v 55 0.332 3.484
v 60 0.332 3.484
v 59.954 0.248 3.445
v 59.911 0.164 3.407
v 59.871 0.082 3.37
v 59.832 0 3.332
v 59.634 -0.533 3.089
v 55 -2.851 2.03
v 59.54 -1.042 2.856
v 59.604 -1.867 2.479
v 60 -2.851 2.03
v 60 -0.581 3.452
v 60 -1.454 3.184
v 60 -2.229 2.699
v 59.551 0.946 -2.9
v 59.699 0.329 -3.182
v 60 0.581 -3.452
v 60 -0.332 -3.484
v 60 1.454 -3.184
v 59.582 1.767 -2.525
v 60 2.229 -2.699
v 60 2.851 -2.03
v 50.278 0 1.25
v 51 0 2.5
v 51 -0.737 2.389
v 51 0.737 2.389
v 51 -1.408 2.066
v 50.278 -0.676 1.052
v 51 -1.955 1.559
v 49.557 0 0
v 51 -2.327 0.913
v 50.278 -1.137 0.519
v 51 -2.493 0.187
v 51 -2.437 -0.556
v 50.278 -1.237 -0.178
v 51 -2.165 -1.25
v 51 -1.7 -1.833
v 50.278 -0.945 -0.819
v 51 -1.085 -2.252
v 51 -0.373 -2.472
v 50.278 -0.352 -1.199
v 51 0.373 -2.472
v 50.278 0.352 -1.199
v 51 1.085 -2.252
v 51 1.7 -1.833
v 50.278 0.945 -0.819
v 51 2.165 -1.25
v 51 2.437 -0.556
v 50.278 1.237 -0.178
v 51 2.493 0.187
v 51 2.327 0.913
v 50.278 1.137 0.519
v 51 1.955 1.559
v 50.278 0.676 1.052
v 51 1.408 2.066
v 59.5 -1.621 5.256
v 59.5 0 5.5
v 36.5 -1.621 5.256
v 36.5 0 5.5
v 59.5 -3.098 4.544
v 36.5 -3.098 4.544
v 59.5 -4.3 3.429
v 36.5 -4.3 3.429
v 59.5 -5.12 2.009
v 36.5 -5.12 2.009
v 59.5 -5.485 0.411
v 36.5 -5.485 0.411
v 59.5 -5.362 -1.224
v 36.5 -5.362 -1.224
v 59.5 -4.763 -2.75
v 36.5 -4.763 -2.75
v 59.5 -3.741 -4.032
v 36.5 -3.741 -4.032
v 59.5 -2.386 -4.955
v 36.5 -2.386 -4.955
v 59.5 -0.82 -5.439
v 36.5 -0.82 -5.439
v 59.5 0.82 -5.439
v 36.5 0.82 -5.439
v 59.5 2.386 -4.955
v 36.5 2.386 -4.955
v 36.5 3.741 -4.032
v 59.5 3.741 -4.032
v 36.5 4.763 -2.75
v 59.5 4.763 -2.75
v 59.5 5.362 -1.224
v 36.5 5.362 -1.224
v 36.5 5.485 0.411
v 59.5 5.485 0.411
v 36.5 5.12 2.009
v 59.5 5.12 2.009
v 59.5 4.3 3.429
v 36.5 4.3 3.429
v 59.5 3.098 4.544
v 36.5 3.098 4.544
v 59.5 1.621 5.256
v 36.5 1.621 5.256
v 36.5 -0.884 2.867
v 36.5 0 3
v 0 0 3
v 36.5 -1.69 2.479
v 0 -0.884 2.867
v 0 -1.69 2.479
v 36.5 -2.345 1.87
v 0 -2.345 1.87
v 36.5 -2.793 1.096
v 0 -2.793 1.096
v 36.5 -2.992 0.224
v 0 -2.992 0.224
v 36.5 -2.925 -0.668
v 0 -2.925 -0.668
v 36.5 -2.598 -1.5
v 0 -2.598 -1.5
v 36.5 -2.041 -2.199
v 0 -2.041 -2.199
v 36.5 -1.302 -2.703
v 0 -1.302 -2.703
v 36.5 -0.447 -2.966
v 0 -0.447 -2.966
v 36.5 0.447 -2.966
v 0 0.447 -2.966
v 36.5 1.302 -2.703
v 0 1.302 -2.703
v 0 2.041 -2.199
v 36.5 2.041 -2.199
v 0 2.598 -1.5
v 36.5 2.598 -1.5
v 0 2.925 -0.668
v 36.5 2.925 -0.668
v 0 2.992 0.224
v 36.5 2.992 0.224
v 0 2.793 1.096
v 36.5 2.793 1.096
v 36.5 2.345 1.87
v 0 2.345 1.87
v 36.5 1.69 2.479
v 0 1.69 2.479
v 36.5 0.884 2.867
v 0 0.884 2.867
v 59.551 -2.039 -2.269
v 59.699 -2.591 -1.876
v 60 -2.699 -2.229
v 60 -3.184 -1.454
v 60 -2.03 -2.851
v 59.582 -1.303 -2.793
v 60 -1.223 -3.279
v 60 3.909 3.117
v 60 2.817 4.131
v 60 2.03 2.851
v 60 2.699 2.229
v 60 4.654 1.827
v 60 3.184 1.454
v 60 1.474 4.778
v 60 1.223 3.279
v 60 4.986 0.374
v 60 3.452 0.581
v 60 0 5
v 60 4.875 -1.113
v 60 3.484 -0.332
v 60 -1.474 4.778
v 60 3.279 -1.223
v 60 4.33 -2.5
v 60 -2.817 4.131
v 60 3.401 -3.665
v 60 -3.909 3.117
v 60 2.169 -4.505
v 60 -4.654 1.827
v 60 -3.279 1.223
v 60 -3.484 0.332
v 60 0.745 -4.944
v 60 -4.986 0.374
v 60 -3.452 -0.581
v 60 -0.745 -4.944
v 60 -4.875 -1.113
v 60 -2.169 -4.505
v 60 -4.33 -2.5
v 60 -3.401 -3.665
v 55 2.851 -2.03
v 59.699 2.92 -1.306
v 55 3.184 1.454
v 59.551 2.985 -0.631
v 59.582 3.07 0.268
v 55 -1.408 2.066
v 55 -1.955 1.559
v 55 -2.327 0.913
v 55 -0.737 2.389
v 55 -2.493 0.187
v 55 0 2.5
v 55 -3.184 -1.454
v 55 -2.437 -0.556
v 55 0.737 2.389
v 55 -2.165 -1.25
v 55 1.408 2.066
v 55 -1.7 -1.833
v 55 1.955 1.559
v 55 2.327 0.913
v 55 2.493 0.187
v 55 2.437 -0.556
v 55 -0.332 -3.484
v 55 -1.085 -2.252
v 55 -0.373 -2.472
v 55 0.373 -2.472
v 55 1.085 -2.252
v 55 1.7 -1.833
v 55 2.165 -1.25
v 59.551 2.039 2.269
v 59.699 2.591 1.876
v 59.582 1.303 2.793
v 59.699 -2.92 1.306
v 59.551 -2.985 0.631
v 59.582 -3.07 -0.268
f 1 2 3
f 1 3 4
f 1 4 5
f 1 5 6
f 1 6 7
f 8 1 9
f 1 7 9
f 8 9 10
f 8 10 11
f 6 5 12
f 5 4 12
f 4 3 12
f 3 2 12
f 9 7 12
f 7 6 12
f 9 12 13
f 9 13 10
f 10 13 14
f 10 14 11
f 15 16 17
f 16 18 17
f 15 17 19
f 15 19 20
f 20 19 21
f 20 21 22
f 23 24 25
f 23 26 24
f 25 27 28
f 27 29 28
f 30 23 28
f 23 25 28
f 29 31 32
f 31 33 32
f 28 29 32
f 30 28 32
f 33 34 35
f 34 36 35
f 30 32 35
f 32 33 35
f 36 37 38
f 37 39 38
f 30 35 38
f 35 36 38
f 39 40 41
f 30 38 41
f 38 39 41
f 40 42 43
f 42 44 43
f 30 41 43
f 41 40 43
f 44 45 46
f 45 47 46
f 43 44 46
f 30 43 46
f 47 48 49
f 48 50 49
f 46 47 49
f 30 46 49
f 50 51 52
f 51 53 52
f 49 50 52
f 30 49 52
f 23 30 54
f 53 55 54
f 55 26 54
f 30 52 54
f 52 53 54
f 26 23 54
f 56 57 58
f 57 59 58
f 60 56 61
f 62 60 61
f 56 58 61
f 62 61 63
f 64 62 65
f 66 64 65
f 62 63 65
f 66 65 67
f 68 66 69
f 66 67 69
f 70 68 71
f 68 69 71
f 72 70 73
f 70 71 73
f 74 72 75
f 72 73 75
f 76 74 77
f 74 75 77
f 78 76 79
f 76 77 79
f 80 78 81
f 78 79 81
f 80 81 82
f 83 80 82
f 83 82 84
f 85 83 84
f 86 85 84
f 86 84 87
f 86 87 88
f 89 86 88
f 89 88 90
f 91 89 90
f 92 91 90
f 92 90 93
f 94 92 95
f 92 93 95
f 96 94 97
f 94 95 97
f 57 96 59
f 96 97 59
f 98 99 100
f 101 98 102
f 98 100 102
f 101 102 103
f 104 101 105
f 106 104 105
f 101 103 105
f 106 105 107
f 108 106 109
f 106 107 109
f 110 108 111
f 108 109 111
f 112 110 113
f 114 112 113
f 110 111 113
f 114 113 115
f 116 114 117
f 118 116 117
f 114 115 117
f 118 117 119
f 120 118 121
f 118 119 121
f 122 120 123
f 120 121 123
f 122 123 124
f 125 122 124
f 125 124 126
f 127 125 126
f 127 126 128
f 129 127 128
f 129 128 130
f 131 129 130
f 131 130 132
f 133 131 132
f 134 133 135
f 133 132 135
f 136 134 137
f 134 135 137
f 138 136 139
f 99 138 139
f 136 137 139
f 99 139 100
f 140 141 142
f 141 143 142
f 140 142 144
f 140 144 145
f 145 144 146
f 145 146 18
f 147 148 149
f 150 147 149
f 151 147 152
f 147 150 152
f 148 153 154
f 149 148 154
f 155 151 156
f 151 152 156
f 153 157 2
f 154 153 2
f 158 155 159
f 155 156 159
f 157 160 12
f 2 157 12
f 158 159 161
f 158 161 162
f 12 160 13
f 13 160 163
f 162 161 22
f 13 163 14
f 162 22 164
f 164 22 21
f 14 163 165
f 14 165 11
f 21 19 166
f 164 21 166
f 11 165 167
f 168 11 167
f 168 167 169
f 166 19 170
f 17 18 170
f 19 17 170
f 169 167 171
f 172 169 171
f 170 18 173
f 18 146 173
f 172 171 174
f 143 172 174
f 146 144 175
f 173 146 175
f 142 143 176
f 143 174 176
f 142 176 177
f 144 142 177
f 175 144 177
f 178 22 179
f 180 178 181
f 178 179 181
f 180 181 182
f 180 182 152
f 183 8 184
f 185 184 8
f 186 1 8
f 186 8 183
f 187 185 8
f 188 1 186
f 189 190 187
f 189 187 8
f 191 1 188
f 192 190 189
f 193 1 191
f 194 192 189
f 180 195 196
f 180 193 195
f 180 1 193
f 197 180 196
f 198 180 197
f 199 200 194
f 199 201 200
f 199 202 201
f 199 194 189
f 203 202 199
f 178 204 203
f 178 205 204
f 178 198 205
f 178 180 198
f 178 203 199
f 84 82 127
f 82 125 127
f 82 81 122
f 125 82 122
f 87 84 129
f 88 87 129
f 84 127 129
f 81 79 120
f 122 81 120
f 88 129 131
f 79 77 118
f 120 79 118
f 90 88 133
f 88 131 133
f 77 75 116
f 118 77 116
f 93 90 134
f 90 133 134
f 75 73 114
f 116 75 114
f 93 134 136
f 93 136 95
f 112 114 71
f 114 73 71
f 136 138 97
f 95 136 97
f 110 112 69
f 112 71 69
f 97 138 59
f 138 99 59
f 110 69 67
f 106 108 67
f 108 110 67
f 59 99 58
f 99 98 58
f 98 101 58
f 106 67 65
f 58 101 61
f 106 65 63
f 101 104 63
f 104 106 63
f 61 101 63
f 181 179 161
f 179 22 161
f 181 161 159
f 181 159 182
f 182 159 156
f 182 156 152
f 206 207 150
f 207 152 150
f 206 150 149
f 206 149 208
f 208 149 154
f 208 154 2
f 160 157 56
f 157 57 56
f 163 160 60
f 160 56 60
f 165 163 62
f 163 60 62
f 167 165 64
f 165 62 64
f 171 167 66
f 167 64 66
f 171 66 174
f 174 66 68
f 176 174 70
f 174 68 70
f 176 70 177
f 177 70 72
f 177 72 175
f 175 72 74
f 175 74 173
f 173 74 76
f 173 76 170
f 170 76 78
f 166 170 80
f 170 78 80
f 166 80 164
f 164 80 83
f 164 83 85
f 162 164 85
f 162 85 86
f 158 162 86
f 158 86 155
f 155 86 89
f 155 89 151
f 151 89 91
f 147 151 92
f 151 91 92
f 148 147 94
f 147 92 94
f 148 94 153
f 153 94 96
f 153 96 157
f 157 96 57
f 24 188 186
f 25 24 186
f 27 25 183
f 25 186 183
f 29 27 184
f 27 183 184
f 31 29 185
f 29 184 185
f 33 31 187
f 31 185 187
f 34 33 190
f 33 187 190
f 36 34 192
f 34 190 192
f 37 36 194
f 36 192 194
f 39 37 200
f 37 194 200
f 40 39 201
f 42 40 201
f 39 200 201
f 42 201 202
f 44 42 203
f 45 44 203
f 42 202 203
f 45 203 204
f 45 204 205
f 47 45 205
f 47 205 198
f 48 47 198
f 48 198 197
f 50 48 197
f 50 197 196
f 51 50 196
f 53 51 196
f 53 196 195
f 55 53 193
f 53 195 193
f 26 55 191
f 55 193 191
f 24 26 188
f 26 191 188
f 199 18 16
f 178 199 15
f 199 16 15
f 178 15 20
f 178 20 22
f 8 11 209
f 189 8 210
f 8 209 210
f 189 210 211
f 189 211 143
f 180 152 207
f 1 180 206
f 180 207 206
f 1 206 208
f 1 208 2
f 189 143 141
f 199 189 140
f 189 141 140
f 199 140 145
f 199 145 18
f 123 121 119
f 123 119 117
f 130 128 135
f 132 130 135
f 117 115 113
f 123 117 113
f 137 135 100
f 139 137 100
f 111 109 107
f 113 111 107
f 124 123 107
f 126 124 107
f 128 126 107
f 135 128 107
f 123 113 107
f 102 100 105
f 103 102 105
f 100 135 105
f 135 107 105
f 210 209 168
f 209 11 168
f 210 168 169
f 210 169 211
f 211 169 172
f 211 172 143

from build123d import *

# Parameters (mm, degrees)
CORTAR_EXTRUIR2_DEPTH = 5


with BuildPart() as part:
    # Croquis1 → Revolución1 (revolve)
    with BuildSketch(Plane(origin=(0, 0, 0), x_dir=(1, 0, 0), z_dir=(0, 1, 0)), mode=Mode.PRIVATE) as revoluci_n1_sk:
        Polygon((0, 0), (49.556624327, 0), (51, 2.5), (58, 2.5), (58, 3), (59.5, 3), (60, 3.5), (60, 5), (59.5, 5.5), (36.5, 5.5), (36.5, 3), (0, 3), align=None)
    revolve(revoluci_n1_sk.sketch.rotate(Axis((0, 0, 0), (1, 0, 0)), 180), axis=Axis((0, 0, 0), (1, 0, 0)))

    # Croquis3 → Cortar-Extruir2 (cut)
    with BuildSketch(Plane(origin=(60, 0, 0), x_dir=(0, 0, -1), z_dir=(1, 0, 0))):
        Polygon((3.484172317, -0.332480476), (2.030022697, 2.8511415), (-1.45414962, 3.183621975), (-3.484172317, 0.332480476), (-2.030022697, -2.8511415), (1.45414962, -3.183621975), align=None)
    extrude(amount=-CORTAR_EXTRUIR2_DEPTH, mode=Mode.SUBTRACT)


solid = part.part
